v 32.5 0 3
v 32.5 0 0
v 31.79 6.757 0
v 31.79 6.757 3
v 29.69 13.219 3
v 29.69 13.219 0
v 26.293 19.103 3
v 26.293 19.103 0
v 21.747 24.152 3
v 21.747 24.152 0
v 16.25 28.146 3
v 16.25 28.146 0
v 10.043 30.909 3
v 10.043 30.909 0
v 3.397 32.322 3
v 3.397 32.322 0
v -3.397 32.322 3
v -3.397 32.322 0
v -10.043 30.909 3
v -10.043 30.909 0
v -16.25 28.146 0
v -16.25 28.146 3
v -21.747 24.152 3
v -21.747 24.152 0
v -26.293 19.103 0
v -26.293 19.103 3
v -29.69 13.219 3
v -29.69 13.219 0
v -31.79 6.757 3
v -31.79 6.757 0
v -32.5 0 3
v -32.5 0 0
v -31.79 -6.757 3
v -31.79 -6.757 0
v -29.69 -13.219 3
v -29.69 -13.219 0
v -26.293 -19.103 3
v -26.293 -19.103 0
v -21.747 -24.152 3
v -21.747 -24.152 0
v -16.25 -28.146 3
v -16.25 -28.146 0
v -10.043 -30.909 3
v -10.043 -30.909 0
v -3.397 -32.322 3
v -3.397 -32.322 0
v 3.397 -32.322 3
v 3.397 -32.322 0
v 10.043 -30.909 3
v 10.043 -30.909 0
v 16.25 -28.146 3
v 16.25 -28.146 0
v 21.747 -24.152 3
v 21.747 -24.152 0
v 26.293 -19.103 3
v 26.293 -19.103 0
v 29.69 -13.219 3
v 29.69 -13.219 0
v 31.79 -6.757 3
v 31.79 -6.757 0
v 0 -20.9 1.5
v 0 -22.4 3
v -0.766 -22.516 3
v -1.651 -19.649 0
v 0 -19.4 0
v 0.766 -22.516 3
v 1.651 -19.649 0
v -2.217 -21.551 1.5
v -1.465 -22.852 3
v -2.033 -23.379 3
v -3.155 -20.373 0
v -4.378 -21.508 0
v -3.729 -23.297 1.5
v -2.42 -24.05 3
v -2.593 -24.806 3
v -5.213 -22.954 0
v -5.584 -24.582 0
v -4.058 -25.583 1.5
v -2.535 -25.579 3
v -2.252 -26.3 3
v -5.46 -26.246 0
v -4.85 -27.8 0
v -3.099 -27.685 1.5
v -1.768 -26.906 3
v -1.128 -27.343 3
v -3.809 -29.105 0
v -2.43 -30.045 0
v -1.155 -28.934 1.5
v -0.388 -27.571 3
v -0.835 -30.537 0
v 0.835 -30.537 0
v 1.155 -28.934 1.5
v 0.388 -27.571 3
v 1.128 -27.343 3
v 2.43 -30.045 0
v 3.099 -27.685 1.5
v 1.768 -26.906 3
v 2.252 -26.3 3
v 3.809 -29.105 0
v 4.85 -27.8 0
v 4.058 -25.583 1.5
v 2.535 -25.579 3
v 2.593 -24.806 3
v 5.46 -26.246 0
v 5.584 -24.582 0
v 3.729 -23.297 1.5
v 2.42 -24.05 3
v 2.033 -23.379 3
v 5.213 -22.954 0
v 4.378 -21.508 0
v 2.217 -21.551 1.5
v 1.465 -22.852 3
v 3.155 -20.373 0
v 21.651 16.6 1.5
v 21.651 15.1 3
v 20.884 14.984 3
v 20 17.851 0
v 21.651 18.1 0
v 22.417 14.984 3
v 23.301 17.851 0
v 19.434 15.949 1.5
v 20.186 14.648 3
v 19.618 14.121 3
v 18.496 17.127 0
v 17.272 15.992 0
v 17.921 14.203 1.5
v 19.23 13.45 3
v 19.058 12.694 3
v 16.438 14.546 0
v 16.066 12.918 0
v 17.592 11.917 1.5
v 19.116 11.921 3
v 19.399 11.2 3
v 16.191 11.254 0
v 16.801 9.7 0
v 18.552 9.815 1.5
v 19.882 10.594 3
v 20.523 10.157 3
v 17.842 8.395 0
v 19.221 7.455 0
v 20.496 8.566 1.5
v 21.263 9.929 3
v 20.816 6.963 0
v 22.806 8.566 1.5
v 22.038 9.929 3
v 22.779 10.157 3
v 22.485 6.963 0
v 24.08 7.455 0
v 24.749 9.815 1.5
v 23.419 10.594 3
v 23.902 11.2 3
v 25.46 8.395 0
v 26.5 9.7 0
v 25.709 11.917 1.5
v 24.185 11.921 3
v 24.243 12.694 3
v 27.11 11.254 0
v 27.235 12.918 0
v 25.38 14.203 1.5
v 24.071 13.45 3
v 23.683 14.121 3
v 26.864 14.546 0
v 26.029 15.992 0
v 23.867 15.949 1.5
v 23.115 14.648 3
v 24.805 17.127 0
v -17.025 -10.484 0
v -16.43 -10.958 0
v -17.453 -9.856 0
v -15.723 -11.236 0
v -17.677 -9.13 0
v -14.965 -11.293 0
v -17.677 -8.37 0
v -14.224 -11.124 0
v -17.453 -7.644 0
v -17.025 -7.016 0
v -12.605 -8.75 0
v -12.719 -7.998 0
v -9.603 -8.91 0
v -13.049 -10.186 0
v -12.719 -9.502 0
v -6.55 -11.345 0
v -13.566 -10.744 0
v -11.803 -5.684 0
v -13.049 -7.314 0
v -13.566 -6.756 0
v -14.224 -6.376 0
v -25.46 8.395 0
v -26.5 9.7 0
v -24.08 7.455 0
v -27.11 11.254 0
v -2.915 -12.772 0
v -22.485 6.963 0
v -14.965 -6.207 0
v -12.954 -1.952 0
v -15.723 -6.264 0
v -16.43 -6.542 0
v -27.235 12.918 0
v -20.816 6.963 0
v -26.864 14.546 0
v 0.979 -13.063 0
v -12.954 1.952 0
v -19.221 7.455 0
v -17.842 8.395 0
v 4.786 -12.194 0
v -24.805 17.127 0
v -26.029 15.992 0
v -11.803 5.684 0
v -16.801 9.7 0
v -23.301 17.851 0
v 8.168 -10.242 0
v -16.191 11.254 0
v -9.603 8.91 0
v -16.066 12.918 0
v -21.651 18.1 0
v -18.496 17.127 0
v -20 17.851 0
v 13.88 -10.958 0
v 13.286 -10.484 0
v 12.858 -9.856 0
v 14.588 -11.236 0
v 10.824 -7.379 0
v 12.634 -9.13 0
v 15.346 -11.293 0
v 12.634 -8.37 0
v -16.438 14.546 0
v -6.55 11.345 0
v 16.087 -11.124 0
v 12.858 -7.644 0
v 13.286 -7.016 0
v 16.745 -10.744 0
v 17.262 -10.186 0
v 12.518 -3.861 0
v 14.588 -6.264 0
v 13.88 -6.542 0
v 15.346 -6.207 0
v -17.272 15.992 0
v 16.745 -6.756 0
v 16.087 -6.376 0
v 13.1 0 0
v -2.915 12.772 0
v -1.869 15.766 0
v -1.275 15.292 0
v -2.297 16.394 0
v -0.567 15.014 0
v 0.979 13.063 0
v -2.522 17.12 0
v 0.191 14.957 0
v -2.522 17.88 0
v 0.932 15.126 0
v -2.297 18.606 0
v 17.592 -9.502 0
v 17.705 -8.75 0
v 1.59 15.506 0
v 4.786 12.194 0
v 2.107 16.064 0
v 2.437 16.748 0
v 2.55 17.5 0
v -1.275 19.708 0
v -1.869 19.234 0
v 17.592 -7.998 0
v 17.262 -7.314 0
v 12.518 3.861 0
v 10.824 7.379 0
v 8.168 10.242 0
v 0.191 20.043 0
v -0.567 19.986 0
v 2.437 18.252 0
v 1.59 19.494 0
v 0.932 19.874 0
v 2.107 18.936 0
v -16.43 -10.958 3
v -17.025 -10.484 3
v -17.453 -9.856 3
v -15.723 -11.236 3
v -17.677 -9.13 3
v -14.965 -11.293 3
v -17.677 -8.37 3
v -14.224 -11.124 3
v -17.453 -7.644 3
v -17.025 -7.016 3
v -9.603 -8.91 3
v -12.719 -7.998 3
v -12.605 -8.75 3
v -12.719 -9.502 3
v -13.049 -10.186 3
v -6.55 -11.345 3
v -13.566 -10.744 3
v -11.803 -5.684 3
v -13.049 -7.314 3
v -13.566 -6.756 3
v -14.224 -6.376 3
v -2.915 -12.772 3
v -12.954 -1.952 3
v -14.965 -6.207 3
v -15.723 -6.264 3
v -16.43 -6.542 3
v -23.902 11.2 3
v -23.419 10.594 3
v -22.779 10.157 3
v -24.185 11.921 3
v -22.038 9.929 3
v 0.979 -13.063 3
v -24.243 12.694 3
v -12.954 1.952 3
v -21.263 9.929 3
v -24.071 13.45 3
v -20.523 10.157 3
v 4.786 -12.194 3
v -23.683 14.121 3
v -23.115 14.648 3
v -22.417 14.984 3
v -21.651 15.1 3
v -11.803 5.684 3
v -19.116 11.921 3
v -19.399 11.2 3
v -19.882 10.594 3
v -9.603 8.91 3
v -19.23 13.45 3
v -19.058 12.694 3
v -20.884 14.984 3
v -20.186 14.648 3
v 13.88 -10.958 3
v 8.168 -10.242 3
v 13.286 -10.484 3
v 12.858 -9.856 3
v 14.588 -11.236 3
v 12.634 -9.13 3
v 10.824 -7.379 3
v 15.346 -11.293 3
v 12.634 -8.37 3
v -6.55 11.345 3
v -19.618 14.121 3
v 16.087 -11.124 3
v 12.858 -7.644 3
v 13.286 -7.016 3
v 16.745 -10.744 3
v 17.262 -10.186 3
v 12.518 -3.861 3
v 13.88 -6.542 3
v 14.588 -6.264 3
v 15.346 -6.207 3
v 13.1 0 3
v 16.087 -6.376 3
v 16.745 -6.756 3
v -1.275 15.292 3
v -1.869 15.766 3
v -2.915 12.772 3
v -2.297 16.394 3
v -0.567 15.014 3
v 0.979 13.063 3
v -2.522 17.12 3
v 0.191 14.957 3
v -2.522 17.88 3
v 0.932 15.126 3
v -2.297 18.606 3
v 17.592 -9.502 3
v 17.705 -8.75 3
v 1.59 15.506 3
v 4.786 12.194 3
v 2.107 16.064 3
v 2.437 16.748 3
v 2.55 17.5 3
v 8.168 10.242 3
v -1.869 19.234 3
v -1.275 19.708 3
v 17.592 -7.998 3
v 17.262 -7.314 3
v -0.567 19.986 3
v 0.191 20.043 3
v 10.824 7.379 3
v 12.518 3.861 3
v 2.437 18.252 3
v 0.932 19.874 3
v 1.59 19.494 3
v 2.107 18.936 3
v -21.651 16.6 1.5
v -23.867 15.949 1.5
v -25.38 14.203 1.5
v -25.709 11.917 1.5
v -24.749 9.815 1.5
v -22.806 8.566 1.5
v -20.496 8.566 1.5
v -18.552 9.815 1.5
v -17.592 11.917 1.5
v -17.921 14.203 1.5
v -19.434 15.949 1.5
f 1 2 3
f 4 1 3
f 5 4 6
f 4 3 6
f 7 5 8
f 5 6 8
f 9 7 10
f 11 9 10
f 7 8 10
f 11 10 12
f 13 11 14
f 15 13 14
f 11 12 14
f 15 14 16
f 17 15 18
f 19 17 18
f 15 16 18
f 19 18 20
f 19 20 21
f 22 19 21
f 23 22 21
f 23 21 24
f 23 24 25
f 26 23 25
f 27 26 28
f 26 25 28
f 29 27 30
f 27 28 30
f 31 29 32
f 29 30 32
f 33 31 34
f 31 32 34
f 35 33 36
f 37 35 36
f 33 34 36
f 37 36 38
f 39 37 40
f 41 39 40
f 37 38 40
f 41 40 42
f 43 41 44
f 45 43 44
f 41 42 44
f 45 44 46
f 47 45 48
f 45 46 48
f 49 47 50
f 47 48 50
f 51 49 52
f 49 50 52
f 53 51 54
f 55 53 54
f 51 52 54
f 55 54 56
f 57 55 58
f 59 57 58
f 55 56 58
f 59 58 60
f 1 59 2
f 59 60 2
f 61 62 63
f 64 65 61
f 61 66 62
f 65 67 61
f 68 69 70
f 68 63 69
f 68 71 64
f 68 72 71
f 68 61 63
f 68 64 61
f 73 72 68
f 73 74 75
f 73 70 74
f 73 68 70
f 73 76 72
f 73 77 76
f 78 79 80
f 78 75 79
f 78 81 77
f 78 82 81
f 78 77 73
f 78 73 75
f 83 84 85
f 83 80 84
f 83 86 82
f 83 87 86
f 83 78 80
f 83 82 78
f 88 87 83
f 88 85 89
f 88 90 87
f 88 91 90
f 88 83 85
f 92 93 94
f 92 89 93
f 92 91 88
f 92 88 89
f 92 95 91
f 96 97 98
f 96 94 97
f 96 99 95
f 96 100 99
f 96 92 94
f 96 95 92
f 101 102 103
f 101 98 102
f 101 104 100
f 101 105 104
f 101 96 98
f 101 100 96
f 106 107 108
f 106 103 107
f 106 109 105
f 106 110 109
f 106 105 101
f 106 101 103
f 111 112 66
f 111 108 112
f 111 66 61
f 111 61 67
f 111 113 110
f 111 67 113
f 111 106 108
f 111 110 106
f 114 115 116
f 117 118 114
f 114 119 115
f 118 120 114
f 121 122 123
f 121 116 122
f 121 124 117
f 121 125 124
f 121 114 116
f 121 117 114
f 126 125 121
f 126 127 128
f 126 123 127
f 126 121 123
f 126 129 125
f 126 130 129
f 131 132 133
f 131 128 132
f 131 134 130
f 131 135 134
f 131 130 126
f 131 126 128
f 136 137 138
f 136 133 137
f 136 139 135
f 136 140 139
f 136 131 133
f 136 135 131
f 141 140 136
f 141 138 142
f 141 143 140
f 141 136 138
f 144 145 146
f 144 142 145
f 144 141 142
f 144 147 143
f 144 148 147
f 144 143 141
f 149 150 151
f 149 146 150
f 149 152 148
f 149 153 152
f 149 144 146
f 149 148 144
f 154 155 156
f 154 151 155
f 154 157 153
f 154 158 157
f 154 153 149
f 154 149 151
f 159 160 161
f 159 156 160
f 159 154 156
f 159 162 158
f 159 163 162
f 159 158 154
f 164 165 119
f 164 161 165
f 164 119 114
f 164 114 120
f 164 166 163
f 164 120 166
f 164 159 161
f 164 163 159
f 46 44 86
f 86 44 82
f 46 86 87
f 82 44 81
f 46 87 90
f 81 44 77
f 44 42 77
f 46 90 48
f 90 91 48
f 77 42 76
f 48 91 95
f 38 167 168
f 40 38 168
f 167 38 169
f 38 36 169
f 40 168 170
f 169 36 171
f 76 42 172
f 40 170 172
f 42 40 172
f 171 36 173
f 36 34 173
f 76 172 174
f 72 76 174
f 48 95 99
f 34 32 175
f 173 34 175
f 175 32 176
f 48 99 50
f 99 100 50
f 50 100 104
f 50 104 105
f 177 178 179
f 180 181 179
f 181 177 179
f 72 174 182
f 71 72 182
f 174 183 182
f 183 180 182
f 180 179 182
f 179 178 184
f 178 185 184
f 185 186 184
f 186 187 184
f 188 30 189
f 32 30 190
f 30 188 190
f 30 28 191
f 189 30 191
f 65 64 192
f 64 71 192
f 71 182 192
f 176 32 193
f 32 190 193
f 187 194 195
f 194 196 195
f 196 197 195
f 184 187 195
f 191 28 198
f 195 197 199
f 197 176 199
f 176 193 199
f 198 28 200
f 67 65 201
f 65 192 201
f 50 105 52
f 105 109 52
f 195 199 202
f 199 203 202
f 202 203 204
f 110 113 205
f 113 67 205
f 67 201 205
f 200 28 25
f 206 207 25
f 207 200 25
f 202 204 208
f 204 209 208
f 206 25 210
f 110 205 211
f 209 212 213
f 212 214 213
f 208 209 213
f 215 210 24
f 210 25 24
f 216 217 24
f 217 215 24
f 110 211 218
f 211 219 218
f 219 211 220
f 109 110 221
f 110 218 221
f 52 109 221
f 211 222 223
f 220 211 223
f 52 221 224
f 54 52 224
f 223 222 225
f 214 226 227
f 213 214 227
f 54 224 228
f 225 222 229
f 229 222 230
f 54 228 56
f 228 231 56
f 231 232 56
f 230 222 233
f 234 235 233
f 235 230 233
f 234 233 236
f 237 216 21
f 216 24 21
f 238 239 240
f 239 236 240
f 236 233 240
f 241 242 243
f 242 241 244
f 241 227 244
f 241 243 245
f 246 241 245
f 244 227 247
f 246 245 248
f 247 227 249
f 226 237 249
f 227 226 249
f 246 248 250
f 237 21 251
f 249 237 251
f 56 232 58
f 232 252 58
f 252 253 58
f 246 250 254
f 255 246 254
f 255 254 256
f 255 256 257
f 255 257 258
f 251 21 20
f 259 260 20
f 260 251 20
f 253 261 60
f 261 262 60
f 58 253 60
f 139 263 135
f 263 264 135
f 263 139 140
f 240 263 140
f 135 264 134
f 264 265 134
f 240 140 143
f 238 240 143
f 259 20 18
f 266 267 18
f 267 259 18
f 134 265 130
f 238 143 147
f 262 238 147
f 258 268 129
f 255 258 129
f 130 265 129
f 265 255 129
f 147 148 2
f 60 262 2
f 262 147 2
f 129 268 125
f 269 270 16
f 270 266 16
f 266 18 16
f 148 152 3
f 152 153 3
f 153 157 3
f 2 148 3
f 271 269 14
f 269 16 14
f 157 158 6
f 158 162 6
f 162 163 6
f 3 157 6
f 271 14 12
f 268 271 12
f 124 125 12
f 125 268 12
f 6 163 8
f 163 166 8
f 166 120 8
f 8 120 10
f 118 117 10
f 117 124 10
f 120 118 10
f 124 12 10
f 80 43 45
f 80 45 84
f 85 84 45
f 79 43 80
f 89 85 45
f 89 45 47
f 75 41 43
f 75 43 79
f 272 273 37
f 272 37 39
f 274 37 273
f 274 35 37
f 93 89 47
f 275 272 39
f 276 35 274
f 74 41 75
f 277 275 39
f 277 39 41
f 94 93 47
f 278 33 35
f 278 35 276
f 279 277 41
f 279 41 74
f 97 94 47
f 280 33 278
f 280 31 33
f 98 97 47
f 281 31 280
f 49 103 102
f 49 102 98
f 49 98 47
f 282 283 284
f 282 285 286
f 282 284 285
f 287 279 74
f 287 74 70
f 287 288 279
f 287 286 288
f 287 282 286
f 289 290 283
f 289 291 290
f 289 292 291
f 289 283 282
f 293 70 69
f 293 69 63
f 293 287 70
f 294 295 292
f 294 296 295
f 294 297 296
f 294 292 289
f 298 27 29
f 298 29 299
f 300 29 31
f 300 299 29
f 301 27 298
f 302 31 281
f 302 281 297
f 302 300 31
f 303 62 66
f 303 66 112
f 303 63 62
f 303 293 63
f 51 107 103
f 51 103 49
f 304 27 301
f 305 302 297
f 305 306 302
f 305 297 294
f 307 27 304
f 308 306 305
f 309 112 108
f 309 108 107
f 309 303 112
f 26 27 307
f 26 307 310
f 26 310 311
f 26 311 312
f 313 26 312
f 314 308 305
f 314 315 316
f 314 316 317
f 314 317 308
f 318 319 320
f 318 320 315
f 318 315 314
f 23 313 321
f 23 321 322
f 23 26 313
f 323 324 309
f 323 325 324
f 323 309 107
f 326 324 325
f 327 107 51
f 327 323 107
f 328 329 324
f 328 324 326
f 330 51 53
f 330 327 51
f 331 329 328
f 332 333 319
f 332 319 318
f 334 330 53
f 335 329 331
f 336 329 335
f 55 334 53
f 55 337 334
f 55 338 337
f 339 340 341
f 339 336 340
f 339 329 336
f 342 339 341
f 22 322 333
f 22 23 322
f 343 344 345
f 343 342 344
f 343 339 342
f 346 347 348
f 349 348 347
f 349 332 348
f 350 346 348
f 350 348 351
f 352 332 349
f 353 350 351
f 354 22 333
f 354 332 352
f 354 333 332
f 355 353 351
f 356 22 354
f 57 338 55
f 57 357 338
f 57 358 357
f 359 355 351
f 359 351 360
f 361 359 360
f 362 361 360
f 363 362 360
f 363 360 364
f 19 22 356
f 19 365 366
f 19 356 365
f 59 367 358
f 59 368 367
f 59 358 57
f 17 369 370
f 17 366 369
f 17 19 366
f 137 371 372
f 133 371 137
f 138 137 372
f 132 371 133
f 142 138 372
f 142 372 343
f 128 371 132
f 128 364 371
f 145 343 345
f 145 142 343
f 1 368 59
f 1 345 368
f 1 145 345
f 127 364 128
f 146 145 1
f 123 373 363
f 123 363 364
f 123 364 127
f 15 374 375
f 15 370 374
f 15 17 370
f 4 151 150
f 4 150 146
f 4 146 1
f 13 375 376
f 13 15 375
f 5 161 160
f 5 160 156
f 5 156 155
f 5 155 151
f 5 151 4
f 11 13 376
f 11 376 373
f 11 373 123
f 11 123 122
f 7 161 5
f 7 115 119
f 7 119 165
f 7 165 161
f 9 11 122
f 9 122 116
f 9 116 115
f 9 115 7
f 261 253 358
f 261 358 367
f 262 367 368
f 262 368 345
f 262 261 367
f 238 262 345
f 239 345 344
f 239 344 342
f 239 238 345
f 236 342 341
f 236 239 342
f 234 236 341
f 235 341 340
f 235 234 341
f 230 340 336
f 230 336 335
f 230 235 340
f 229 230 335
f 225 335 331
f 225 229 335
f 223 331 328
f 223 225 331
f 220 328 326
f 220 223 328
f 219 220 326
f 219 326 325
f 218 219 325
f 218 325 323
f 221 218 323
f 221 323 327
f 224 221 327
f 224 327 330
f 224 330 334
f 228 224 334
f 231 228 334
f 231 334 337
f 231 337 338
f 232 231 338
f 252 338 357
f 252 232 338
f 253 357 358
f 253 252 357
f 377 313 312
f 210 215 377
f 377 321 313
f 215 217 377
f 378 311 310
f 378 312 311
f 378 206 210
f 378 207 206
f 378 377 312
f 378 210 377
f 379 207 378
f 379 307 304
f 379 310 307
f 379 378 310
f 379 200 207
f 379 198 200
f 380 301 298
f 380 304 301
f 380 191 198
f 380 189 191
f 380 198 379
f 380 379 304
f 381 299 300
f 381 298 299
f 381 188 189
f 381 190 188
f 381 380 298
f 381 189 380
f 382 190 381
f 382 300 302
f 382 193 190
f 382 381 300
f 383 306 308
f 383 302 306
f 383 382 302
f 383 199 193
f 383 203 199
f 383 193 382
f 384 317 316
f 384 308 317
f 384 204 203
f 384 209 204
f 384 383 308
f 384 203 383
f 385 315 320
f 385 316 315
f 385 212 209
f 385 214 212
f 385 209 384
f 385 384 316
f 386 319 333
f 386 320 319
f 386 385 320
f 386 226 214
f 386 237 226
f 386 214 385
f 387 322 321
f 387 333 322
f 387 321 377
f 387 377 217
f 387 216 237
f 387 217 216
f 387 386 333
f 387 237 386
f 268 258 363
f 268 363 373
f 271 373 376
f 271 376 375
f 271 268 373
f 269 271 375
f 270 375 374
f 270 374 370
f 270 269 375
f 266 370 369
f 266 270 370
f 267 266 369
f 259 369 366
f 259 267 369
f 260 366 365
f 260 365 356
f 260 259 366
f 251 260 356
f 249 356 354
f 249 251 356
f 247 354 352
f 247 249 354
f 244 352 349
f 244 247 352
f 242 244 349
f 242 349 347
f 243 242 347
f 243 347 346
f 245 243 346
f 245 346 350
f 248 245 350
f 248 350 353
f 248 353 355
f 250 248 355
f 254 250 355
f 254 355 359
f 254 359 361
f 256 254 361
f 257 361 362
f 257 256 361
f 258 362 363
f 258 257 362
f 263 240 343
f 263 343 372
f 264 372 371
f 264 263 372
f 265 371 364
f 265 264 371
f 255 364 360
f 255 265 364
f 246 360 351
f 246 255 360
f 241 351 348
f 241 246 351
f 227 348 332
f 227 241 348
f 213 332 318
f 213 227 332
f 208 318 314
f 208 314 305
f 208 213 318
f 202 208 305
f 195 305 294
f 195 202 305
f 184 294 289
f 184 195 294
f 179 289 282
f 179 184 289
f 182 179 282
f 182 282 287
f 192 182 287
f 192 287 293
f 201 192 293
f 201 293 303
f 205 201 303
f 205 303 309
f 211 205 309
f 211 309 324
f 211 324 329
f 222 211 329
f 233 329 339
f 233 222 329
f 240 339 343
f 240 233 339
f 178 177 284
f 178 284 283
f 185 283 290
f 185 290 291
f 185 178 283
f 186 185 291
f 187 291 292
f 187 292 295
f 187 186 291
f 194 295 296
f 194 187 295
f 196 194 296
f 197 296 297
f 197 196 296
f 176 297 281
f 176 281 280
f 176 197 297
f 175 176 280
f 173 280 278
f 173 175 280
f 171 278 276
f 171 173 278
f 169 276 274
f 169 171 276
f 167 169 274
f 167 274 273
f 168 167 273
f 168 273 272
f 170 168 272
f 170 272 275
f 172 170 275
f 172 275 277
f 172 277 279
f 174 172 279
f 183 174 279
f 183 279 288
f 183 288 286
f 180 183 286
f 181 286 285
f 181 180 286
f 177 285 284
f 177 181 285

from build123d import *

# Parameters (mm, degrees)
SKETCH_1_R               = 32.5
SKETCH_1_R_2             = 2.55
SKETCH_1_R_3             = 13.1
EXTRUDE_1_DEPTH          = 3
HOLE_WIZARD_1_AT_2_COUNT = 2
HOLE_WIZARD_1_AT_2_PITCH = 43.301270189
HOLE_WIZARD_1_AT_3_COUNT = 2
HOLE_WIZARD_1_AT_3_PITCH = 43.301270189


with BuildPart() as part:
    # 草图1 → 凸台-拉伸1 (new body)
    with BuildSketch(Plane.XY):
        Circle(SKETCH_1_R)
        with Locations((0, 17.5)):
            Circle(SKETCH_1_R_2, mode=Mode.SUBTRACT)
        with Locations((15.155444566, -8.75)):
            Circle(SKETCH_1_R_2, mode=Mode.SUBTRACT)
        with Locations((-15.155444566, -8.75)):
            Circle(SKETCH_1_R_2, mode=Mode.SUBTRACT)
        with Locations((21.650635095, 12.5)):
            Circle(SKETCH_1_R_2, mode=Mode.SUBTRACT)
        with Locations((0, -25)):
            Circle(SKETCH_1_R_2, mode=Mode.SUBTRACT)
        with Locations((-21.650635095, 12.5)):
            Circle(SKETCH_1_R_2, mode=Mode.SUBTRACT)
        Circle(SKETCH_1_R_3, mode=Mode.SUBTRACT)
    extrude(amount=EXTRUDE_1_DEPTH)

    # 草图3 → 打孔尺寸(%根据十字)槽沉头木螺钉的类型1 (revolve, cut)
    with BuildSketch(Plane(origin=(21.650635095, 12.5, 0), x_dir=(0, 1, 0), z_dir=(1, 0, 0))):
        Polygon((0, 0), (0, 3), (2.5, 3), (2.5, 3.1), (5.6, 0), align=None)
    hole_wizard_1 = revolve(axis=Axis((21.650635095, 12.5, -6.35), (0, 0, 1)), mode=Mode.SUBTRACT)

    # 打孔尺寸(%根据十字)槽沉头木螺钉的类型1 at 2: 打孔尺寸(%根据十字)槽沉头木螺钉的类型1 ×2
    with Locations(*[(-i * HOLE_WIZARD_1_AT_2_PITCH, 0, 0) for i in range(1, HOLE_WIZARD_1_AT_2_COUNT)]):
        add(hole_wizard_1, mode=Mode.SUBTRACT)

    # 打孔尺寸(%根据十字)槽沉头木螺钉的类型1 at 3: 打孔尺寸(%根据十字)槽沉头木螺钉的类型1 ×2
    with Locations(*[Vector(-0.5000000000000018, -0.8660254037844376, 0) * (i * HOLE_WIZARD_1_AT_3_PITCH) for i in range(1, HOLE_WIZARD_1_AT_3_COUNT)]):
        add(hole_wizard_1, mode=Mode.SUBTRACT)


solid = part.part
